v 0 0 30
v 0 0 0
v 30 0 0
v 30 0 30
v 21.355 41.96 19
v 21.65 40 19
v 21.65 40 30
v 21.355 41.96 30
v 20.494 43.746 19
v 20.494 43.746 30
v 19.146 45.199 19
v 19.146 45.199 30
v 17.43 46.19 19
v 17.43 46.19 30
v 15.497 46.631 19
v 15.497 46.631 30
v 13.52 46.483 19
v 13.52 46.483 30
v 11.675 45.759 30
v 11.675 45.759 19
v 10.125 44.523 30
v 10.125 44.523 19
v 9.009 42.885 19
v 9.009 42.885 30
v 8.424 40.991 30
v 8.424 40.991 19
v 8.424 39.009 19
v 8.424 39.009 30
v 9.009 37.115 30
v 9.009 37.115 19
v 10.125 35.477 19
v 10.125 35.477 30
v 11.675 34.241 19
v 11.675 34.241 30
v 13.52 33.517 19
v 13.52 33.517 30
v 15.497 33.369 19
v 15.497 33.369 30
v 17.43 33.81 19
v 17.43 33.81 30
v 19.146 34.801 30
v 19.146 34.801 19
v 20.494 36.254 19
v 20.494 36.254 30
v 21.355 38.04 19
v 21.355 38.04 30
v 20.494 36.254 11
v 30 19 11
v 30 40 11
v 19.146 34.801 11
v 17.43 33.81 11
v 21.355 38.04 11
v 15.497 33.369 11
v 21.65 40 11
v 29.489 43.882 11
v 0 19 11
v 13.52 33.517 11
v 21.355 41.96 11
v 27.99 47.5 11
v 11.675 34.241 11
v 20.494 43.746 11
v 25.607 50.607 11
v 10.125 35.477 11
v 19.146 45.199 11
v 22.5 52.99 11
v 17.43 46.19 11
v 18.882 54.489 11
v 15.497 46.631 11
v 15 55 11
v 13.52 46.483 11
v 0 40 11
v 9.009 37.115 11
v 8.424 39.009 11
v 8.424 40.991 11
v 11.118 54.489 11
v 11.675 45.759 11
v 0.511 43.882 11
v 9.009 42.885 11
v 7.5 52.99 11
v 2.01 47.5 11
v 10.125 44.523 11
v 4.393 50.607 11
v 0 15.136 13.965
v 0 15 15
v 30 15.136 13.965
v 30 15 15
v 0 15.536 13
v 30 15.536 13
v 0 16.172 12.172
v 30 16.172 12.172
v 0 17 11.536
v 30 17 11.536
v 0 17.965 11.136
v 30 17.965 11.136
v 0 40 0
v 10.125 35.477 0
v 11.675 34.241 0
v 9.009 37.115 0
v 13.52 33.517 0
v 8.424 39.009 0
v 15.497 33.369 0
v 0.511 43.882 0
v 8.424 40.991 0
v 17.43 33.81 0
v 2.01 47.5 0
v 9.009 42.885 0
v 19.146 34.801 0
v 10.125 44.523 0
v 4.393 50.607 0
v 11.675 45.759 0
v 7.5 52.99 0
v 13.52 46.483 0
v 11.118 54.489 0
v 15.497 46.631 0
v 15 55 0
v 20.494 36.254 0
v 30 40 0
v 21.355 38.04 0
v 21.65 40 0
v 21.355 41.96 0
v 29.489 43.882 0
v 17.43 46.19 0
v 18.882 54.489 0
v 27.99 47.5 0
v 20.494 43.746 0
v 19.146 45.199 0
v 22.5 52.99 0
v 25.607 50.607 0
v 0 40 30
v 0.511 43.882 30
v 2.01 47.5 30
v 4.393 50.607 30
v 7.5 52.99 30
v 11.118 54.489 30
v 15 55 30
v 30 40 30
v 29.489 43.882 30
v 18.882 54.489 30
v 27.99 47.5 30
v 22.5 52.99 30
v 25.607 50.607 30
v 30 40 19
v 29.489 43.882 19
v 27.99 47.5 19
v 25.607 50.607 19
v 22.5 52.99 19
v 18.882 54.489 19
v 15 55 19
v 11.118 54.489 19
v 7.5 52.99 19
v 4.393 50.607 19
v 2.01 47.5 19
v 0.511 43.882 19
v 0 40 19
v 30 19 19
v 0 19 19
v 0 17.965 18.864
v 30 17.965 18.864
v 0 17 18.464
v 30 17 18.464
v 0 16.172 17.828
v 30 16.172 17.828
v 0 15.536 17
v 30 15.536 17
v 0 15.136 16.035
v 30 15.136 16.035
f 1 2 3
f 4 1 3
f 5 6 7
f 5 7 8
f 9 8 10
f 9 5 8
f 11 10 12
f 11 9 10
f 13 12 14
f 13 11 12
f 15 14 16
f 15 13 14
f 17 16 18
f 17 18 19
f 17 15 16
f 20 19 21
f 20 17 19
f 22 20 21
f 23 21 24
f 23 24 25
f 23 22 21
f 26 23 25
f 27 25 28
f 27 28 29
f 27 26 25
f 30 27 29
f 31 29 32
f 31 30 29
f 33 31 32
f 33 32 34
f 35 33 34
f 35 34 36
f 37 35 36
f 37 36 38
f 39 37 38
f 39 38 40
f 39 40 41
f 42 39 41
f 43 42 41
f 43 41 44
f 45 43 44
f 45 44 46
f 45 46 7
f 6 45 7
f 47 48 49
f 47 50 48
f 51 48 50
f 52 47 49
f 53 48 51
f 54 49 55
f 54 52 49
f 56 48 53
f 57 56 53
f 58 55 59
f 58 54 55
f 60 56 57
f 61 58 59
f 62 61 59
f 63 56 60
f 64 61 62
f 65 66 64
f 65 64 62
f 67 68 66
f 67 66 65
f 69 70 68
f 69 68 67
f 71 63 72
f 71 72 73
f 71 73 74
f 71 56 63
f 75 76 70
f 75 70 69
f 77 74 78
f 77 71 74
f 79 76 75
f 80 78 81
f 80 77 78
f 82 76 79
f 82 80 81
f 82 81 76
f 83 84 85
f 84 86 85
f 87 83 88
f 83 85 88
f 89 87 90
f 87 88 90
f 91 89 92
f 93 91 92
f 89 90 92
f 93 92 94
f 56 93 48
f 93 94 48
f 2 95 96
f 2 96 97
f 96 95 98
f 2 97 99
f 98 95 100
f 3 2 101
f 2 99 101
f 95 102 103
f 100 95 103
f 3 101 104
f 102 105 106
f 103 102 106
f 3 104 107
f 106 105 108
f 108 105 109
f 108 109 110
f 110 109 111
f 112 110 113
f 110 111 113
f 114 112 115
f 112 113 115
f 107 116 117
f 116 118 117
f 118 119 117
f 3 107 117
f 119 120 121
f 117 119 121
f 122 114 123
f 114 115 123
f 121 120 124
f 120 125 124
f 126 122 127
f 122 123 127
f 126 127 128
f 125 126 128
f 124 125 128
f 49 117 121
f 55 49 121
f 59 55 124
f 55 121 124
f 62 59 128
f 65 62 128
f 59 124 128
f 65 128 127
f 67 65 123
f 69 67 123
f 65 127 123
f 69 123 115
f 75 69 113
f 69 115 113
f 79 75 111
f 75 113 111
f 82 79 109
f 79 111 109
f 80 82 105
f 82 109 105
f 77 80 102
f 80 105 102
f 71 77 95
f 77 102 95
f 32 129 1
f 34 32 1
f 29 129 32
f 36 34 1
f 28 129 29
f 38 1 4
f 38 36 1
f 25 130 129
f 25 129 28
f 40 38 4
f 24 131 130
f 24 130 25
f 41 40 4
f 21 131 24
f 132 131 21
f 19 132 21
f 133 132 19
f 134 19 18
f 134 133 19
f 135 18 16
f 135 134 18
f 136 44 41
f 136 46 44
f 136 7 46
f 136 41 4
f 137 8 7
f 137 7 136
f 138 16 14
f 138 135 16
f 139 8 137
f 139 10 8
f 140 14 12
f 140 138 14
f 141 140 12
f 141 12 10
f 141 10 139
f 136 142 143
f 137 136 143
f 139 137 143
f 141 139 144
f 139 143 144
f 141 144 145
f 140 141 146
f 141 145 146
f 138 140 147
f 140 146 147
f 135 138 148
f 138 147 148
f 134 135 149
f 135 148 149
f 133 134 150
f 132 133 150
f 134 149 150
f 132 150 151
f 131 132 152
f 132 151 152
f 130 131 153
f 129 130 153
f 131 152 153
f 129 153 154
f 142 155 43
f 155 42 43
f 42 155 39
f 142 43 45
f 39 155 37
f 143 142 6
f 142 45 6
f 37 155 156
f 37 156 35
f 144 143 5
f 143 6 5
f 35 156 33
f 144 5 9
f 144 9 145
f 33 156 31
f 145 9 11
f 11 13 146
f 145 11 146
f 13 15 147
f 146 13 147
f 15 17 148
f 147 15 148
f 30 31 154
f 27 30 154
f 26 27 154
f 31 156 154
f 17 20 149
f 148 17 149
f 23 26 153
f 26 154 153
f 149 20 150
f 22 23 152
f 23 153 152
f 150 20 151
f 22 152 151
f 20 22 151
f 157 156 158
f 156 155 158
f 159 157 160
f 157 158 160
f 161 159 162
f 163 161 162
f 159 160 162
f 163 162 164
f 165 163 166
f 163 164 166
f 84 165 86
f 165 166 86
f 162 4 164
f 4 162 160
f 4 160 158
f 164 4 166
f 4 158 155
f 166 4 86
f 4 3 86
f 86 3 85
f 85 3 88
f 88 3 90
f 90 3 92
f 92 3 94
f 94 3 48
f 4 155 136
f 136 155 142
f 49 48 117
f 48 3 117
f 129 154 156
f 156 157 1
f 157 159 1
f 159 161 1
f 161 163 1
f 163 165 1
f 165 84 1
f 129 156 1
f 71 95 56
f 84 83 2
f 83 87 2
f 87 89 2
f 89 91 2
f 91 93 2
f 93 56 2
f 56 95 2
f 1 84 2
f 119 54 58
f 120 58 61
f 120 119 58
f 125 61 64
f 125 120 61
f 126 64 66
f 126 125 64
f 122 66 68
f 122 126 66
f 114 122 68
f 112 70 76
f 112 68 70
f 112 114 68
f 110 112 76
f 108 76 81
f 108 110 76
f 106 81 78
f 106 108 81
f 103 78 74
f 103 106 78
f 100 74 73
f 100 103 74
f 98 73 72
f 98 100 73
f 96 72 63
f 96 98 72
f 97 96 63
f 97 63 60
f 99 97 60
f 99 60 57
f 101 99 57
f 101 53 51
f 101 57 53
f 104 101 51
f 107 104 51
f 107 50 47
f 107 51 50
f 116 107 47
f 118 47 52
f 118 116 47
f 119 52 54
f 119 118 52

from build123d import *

# Parameters (mm, degrees)
SKETCH1_R           = 6.65
BOSS_EXTRUDE1_DEPTH = 30
SKETCH2_W           = 8
SKETCH2_H           = 40
CUT_EXTRUDE1_DEPTH  = 70.462219947
FILLET1_R           = 4


with BuildPart() as part:
    # Sketch1 → Boss-Extrude1 (new body)
    with BuildSketch(Plane.XY):
        with BuildLine():
            Line((0, 0), (30, 0))
            Line((30, 0), (30, 40))
            ThreePointArc((30, 40), (15, 55), (0, 40))
            Line((0, 40), (0, 0))
        make_face()
        with Locations((15, 40)):
            Circle(SKETCH1_R, mode=Mode.SUBTRACT)
    extrude(amount=BOSS_EXTRUDE1_DEPTH)

    # Sketch2 → Cut-Extrude1 (cut, through all)
    with BuildSketch(Plane.ZY):
        with Locations((15, 35)):
            Rectangle(SKETCH2_W, SKETCH2_H)
    extrude(amount=-CUT_EXTRUDE1_DEPTH, mode=Mode.SUBTRACT)

    # Fillet1
    fillet1_edges = [part.edges().sort_by_distance(p)[0] for p in [
        (15, 15, 19),
        (15, 15, 11),
    ]]
    fillet(fillet1_edges, radius=FILLET1_R - 0.0001)  # a hair under: the kernel refuses the full size


solid = part.part
